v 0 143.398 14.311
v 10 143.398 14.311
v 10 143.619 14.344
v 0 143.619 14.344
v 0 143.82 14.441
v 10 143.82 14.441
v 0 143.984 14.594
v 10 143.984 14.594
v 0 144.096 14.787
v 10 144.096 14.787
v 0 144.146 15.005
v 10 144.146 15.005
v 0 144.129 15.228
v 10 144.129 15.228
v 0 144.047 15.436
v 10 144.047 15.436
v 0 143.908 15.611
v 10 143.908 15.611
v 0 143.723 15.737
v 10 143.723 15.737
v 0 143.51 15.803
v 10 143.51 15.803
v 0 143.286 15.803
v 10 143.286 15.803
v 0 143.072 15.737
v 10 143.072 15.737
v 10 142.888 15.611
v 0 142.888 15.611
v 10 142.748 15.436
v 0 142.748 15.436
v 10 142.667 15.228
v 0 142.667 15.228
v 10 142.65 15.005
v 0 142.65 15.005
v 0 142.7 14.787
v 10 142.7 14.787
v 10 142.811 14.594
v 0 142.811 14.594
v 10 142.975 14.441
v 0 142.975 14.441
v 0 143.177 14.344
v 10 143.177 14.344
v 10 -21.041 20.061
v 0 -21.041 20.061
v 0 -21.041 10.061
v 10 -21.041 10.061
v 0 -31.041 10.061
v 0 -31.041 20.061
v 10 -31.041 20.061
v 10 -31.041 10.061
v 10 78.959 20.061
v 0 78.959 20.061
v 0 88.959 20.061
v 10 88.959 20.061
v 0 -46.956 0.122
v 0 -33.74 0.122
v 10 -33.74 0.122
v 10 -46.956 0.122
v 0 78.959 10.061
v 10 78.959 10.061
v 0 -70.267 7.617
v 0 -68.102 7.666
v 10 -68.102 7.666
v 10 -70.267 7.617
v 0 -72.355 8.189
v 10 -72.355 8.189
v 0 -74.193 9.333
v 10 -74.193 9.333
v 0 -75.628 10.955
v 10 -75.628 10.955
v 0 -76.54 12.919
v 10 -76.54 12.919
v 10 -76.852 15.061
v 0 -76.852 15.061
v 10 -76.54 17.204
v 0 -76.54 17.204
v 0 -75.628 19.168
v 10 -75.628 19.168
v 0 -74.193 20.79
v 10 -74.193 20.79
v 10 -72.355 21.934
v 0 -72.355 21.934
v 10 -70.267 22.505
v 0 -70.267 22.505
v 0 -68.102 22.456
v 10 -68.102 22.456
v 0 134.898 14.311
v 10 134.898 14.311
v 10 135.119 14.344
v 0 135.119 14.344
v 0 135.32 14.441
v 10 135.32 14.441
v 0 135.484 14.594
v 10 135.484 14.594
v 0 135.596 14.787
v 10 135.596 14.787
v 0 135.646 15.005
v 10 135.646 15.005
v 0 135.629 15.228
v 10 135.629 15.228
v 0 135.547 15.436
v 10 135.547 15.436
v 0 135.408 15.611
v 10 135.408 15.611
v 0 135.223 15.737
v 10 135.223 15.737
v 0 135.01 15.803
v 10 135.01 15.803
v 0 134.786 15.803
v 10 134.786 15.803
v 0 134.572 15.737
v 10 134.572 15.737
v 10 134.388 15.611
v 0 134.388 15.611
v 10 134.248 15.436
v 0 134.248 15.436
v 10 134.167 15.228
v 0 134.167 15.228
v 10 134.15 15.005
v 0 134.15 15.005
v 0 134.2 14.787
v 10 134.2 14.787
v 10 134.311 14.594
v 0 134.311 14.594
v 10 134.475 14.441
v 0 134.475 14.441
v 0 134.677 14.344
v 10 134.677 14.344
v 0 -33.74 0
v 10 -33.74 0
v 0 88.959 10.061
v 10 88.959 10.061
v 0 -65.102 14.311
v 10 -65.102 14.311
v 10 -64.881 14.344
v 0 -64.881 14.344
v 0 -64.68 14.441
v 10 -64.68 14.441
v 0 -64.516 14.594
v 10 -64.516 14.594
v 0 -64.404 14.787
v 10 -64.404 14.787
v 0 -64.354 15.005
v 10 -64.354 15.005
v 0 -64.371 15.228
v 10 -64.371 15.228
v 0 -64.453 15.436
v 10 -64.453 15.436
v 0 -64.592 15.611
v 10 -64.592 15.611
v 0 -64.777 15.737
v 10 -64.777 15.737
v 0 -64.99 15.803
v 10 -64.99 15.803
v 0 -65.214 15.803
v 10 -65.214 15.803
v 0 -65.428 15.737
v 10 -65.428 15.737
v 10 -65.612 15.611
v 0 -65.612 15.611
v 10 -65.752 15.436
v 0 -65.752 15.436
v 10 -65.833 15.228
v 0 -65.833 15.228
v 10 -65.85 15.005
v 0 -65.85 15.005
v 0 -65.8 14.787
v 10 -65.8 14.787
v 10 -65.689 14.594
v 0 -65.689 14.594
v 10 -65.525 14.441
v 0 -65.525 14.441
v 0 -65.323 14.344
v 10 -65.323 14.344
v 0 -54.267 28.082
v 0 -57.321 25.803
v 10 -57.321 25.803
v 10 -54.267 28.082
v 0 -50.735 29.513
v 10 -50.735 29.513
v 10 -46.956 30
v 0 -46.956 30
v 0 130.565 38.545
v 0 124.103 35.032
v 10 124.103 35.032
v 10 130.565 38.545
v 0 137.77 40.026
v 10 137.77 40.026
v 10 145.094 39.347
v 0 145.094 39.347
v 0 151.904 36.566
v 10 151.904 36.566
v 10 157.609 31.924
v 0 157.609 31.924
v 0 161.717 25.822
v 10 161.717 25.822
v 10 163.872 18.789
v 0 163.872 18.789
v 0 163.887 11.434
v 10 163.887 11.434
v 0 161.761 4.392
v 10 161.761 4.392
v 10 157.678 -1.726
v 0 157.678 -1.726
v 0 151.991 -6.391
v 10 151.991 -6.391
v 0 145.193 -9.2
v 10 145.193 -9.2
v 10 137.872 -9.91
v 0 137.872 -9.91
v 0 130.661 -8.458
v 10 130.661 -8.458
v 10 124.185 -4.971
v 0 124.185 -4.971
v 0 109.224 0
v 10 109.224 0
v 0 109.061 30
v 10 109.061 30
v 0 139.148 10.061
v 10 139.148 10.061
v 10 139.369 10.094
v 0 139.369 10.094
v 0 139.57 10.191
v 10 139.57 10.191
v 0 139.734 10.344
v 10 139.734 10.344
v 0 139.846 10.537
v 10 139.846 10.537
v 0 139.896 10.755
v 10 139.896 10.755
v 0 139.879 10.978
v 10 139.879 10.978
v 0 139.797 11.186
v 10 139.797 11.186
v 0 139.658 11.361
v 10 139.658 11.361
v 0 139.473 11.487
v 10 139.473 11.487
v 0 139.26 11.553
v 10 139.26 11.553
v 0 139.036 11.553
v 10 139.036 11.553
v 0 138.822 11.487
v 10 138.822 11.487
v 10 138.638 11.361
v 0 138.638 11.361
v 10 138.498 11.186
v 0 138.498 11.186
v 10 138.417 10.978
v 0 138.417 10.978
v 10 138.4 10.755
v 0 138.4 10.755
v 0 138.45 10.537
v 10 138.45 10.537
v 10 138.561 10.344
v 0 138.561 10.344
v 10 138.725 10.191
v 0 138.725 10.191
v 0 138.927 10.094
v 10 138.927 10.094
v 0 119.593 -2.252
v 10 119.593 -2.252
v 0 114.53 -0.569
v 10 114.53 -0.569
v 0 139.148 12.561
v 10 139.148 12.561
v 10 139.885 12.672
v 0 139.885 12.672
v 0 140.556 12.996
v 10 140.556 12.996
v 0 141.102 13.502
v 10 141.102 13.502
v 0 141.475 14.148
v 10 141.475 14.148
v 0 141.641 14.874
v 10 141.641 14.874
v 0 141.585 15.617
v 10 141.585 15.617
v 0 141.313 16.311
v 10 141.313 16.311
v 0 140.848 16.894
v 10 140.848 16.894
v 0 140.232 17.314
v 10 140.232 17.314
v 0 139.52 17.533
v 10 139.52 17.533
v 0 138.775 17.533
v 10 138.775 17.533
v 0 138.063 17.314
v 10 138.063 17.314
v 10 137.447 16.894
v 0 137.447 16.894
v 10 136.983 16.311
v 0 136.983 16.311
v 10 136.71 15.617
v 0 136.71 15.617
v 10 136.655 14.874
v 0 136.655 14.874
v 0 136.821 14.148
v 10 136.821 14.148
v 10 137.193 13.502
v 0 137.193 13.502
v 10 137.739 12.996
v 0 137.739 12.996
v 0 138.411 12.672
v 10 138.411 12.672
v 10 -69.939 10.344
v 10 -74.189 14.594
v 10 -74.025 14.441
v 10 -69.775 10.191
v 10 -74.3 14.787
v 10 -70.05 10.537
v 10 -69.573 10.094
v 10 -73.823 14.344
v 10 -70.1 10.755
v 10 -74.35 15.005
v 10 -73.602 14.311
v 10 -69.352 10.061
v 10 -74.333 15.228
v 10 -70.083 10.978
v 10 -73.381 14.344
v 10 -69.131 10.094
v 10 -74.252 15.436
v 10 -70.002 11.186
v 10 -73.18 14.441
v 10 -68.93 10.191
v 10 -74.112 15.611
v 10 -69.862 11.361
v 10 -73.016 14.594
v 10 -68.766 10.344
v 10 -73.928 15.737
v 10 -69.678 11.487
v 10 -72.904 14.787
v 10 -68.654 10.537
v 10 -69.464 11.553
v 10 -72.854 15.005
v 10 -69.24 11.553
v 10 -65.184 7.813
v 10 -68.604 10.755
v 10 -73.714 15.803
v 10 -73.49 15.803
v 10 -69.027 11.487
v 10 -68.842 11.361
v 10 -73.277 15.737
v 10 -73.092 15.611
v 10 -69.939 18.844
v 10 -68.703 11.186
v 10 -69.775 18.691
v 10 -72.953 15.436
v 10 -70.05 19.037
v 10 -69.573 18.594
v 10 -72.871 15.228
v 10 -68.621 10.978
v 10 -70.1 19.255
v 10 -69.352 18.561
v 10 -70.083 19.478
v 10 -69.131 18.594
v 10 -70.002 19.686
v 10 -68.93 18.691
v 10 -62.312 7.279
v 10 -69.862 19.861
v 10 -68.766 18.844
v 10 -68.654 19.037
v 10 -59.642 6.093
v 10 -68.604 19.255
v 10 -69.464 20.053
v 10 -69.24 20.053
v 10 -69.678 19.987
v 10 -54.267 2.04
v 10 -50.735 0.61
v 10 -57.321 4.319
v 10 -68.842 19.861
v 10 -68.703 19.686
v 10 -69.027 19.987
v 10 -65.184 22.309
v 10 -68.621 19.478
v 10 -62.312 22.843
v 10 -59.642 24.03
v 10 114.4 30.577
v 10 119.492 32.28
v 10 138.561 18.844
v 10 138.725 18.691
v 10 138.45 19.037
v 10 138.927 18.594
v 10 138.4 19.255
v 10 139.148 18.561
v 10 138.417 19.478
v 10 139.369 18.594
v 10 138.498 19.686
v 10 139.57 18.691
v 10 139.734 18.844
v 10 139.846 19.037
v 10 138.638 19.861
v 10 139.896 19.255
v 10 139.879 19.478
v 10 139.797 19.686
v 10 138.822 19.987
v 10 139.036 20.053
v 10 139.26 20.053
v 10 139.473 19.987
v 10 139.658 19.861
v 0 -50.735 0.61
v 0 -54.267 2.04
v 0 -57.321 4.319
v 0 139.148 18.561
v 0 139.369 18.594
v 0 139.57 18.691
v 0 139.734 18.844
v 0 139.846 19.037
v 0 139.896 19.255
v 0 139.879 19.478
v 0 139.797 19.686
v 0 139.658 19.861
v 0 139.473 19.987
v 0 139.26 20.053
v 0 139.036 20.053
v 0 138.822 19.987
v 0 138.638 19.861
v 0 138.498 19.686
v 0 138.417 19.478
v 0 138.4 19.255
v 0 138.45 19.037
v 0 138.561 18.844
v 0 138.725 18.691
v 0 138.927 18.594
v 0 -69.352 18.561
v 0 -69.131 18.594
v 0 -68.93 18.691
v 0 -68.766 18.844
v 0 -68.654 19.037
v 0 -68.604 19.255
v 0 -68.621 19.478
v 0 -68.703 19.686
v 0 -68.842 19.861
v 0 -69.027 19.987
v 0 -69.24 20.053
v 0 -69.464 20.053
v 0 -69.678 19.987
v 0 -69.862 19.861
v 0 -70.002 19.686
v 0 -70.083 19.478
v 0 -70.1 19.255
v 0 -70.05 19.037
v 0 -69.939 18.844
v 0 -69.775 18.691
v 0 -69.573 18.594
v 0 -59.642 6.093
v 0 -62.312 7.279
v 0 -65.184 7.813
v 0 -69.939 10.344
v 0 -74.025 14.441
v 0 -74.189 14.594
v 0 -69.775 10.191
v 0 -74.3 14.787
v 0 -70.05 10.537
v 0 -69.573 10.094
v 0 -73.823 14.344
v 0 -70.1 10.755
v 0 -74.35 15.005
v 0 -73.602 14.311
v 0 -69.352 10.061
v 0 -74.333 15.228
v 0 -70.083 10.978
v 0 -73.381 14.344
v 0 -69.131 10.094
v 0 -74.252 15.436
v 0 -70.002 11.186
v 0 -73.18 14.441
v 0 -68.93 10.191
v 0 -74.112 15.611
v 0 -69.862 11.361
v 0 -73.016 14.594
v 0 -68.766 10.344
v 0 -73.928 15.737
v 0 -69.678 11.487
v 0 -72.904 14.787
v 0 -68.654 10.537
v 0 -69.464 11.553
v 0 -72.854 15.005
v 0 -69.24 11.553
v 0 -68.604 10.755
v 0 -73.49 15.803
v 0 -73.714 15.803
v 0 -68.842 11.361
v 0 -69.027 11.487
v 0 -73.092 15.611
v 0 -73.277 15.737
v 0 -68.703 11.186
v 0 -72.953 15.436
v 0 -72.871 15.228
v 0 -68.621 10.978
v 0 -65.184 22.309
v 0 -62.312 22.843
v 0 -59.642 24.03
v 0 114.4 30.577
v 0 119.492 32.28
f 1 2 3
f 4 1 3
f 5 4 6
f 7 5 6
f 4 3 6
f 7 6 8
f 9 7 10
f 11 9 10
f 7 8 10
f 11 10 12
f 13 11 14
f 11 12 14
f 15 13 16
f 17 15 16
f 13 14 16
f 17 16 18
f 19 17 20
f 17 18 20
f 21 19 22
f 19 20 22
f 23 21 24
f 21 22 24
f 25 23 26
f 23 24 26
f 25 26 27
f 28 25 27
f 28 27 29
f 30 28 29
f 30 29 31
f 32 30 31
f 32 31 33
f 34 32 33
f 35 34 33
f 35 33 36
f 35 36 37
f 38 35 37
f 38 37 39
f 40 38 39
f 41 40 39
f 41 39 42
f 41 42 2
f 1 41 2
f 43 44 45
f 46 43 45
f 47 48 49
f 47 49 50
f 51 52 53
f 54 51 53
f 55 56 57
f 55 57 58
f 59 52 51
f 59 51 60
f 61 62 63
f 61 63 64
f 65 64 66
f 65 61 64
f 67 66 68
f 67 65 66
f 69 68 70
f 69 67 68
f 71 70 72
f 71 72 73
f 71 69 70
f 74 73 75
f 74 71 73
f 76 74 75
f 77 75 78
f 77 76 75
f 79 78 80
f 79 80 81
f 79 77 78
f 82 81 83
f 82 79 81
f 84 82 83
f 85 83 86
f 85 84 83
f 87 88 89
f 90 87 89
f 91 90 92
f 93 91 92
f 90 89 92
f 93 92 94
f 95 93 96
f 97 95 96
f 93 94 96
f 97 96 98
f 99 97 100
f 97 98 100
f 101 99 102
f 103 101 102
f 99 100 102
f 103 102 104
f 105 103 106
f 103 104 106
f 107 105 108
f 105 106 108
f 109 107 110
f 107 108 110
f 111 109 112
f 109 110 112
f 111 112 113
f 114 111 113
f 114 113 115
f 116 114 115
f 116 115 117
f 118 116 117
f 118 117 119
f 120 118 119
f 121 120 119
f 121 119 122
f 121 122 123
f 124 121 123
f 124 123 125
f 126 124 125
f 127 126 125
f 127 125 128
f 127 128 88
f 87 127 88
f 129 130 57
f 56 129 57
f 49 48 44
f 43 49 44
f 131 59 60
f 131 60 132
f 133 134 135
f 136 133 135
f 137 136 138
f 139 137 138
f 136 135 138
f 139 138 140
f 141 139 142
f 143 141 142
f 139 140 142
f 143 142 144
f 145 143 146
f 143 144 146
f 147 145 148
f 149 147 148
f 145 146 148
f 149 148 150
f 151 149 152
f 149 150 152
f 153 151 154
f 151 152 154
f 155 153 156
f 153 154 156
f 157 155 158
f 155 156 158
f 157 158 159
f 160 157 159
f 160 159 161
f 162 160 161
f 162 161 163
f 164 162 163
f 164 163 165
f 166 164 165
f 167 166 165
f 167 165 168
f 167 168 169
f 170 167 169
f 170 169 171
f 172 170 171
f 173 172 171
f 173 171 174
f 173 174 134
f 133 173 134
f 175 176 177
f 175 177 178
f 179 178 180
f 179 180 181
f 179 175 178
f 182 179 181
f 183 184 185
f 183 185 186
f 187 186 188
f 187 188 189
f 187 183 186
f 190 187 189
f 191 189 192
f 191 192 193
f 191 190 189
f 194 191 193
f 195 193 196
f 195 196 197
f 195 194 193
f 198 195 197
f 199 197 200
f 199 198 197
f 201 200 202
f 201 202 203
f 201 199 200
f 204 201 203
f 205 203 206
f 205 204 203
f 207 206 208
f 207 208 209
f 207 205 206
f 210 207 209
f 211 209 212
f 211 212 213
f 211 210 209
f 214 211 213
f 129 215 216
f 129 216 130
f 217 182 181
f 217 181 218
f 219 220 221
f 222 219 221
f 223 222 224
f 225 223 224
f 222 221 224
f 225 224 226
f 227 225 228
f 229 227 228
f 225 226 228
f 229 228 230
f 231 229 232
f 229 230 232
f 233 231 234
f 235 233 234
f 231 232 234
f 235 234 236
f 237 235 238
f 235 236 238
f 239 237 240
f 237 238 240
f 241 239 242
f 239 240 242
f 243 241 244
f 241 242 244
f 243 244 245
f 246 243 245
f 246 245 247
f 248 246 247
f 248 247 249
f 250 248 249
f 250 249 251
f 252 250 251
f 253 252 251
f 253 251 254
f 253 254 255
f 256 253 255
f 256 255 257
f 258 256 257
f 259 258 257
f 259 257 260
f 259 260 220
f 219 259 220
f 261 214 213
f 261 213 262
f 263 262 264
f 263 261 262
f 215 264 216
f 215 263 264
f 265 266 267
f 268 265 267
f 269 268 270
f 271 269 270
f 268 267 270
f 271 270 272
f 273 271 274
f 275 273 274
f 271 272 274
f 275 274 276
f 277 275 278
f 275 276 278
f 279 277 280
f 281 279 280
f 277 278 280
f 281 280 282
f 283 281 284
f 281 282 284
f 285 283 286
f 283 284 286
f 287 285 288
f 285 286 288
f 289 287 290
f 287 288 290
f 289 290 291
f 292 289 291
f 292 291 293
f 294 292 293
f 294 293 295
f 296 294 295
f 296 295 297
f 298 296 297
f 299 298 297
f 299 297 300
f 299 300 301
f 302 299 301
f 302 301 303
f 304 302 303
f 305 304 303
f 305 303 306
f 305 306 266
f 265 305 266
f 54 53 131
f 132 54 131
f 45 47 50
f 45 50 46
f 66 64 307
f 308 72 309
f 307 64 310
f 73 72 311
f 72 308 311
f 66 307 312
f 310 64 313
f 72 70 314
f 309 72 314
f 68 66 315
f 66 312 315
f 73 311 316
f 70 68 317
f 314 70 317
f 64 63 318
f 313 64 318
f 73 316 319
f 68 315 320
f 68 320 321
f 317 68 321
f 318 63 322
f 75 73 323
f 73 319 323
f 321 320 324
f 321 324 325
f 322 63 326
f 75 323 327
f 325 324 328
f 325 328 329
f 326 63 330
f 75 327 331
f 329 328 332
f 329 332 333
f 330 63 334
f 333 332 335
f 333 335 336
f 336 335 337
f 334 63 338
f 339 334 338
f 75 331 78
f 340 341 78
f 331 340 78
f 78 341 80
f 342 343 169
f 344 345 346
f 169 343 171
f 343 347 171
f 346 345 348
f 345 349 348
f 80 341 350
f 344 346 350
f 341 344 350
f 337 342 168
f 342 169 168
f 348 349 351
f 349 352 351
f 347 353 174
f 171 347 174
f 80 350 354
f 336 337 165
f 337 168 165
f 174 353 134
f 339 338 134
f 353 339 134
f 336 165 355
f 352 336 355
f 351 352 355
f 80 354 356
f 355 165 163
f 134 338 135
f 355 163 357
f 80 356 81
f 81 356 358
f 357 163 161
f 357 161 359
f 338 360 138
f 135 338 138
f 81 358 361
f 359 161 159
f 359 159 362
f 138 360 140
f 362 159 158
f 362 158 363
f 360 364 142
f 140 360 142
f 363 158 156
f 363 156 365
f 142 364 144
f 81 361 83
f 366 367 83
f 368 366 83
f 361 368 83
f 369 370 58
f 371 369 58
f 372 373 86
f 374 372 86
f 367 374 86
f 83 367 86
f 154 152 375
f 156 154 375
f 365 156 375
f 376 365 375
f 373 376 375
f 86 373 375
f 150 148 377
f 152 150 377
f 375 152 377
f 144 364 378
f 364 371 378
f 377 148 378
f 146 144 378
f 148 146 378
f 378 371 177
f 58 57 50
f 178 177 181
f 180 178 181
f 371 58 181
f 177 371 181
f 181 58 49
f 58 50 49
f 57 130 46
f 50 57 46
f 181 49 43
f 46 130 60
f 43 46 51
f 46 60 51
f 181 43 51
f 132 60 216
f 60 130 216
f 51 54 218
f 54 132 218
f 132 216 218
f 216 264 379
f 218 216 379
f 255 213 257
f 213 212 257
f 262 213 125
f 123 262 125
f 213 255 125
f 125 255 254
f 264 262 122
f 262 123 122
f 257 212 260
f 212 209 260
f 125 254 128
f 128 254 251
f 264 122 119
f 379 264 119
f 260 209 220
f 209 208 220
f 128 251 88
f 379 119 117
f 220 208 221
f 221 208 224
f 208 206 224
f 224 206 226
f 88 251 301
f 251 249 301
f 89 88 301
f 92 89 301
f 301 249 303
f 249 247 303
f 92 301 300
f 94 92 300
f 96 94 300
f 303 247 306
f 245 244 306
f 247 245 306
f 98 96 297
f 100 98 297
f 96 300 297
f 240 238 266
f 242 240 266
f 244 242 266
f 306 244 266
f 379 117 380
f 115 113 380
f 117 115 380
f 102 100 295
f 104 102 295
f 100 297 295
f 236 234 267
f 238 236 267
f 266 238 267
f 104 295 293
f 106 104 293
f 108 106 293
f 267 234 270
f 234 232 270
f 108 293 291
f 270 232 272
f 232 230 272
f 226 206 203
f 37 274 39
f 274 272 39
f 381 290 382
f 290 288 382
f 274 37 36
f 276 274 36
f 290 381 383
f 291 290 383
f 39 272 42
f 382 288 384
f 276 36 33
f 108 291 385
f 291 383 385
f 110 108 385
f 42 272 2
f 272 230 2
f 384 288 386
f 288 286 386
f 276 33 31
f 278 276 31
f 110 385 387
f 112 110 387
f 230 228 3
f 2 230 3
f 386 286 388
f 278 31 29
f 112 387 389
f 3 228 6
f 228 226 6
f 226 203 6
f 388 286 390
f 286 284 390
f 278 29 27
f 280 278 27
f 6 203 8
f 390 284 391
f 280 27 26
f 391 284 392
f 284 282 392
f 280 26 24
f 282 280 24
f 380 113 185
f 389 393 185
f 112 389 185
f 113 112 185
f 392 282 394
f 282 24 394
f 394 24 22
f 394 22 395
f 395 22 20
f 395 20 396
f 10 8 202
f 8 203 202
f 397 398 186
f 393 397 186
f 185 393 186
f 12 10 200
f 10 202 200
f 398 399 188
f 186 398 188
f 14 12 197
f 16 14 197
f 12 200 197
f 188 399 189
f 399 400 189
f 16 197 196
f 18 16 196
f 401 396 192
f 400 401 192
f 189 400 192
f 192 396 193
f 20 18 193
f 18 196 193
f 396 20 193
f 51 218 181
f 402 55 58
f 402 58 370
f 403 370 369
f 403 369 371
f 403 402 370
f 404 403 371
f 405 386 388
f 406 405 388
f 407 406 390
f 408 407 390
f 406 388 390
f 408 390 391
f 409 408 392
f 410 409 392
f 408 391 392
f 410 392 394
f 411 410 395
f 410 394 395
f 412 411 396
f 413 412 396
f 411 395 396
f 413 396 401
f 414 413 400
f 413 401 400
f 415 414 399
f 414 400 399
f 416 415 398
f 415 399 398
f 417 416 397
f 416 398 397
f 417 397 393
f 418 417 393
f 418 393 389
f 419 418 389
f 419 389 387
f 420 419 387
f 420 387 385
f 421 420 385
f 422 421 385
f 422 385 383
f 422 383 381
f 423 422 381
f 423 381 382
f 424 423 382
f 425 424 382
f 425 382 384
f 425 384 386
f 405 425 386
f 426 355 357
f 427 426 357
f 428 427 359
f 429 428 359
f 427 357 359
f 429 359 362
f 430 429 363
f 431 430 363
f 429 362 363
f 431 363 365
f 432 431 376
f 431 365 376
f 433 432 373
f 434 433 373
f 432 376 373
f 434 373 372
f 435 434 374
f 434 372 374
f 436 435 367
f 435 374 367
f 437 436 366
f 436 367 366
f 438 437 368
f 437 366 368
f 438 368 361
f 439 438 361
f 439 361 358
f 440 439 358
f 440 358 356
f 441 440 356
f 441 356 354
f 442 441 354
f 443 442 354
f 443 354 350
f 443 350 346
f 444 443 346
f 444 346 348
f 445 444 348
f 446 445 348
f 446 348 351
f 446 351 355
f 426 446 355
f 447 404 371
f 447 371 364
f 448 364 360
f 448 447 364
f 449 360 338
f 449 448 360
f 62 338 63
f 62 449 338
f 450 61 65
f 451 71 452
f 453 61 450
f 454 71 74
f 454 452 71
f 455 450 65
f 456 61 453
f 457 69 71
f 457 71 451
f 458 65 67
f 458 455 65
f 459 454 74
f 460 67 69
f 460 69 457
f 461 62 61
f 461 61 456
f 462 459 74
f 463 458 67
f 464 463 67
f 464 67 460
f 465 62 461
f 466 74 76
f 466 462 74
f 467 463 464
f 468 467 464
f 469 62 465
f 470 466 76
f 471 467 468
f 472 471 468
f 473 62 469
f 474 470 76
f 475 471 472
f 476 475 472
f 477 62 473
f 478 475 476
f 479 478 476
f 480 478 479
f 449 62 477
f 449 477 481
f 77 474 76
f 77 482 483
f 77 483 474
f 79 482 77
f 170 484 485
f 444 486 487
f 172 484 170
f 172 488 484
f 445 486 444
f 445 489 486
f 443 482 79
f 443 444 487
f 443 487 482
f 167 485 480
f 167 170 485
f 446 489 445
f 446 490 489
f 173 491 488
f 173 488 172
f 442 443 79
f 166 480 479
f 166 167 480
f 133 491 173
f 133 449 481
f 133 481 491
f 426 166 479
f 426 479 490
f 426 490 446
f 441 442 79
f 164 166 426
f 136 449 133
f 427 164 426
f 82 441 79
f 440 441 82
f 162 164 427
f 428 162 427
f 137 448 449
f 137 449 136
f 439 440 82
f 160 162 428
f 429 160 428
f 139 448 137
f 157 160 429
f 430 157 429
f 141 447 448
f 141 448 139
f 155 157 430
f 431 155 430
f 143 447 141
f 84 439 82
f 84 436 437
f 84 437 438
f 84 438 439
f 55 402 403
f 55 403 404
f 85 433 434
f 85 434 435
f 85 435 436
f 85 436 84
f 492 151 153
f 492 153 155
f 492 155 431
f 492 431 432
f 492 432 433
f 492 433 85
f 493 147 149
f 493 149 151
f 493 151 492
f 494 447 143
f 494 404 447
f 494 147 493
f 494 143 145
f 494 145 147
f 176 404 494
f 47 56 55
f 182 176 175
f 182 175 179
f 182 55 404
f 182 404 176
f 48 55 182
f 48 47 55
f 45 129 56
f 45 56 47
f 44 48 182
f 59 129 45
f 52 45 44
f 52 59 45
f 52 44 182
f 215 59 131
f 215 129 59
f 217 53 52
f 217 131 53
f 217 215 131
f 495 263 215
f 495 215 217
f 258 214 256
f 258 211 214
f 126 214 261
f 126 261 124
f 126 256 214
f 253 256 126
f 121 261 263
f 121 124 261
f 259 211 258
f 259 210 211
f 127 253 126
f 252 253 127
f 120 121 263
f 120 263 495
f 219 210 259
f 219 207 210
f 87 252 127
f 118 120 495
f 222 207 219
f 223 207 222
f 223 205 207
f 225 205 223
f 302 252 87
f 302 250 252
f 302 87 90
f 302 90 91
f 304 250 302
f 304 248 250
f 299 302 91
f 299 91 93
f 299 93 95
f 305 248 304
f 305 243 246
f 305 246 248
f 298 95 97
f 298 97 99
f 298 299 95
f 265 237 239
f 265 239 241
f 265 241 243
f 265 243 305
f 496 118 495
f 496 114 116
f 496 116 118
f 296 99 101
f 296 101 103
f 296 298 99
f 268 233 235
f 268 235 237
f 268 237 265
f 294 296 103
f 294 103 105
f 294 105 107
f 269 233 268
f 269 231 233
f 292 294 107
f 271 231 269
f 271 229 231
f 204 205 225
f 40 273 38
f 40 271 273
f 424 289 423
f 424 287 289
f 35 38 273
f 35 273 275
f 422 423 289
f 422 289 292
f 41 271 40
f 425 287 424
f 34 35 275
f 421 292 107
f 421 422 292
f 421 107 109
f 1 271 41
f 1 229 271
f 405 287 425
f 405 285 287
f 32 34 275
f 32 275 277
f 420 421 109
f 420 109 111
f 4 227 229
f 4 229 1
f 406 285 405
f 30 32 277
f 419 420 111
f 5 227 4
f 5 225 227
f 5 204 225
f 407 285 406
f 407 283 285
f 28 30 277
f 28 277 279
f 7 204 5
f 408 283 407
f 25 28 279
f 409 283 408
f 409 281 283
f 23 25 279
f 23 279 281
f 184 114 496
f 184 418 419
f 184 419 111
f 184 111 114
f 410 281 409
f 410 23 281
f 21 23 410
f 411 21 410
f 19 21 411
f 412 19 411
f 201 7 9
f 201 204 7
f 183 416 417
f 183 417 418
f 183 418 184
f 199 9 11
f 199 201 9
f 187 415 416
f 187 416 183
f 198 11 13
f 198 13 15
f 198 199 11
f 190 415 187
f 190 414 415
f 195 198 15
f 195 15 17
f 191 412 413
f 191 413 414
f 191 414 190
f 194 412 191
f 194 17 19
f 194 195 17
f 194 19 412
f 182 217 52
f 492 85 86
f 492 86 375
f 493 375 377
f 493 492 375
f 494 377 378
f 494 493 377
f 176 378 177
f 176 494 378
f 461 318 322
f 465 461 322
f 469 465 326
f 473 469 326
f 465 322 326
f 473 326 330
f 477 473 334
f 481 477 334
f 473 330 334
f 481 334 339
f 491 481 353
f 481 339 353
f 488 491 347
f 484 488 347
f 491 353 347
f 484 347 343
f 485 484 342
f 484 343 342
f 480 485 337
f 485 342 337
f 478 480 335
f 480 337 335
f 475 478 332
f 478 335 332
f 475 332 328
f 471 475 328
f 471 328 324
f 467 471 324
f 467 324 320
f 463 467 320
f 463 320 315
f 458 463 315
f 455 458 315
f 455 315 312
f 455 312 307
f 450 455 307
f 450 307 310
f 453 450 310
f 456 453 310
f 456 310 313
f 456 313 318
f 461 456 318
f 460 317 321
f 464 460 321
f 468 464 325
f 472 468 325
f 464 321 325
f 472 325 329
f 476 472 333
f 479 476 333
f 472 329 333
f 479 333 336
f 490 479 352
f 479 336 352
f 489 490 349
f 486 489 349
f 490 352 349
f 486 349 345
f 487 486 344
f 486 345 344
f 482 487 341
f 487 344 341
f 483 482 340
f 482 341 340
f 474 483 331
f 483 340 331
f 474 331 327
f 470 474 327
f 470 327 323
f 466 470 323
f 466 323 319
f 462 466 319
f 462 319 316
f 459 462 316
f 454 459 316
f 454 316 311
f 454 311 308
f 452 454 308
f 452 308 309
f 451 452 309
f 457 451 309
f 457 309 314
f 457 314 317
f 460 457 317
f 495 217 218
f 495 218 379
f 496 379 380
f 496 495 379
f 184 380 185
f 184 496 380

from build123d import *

# Parameters (mm, degrees)
SKETCH1_W           = 10
SKETCH1_H           = 10
BOSS_EXTRUDE1_DEPTH = 10
SKETCH2_R           = 0.75
CUT_EXTRUDE1_DEPTH  = 170.265249142
SKETCH3_R           = 0.75
CUT_EXTRUDE2_DEPTH  = 170.265249142
CUT_EXTRUDE5_START  = -10
CUT_EXTRUDE5_DEPTH  = 10
SKETCH5_R           = 2.5
CUT_EXTRUDE6_DEPTH  = 170.265249142


with BuildPart() as part:
    # Sketch1 → Boss-Extrude1 (new body)
    with BuildSketch(Plane(origin=(0, 0, 0), x_dir=(0, 0, -1), z_dir=(1, 0, 0))):
        with BuildLine():
            Line((0, 109.22405545), (0, -43.10336506))
            ThreePointArc((0, -43.10336506), (0.541577594, -48.278843147), (2.142845875, -53.230087397))
            ThreePointArc((2.142845875, -53.230087397), (-15.125529103, -79.668997921), (-32.212650318, -53.112585274))
            ThreePointArc((-32.212650318, -53.112585274), (-30.559421631, -48.088849966), (-30, -42.82975033))
            Line((-30, -42.82975033), (-30, 109.060958061))
            ThreePointArc((-30, 109.060958061), (-31.291322972, 116.99182394), (-35.031890687, 124.103385075))
            ThreePointArc((-35.031890687, 124.103385075), (-15.112146754, 164.150992221), (4.970722417, 124.184939097))
            ThreePointArc((4.970722417, 124.184939097), (1.275203483, 117.106569656), (0, 109.22405545))
        make_face()
        with Locations((-15.061172266, 83.959086258)):
            Rectangle(SKETCH1_W, SKETCH1_H, mode=Mode.SUBTRACT)
        with Locations((-15.061172266, -26.040913742)):
            Rectangle(SKETCH1_W, SKETCH1_H, mode=Mode.SUBTRACT)
    extrude(amount=BOSS_EXTRUDE1_DEPTH)

    # Sketch2 → Cut-Extrude1 (cut, through all)
    with BuildSketch(Plane(origin=(10, 0, 0), x_dir=(0, 0, -1), z_dir=(1, 0, 0))):
        with Locations((-15.061172266, 143.397777589)):
            Circle(SKETCH2_R)
        with Locations((-19.311172266, 139.147777589)):
            Circle(SKETCH2_R)
        with Locations((-10.811172266, 139.147777589)):
            Circle(SKETCH2_R)
        with Locations((-15.061172266, 134.897777589)):
            Circle(SKETCH2_R)
    extrude(amount=-CUT_EXTRUDE1_DEPTH, mode=Mode.SUBTRACT)

    # Sketch3 → Cut-Extrude2 (cut, through all)
    with BuildSketch(Plane(origin=(10, 0, 0), x_dir=(0, 0, -1), z_dir=(1, 0, 0))):
        with Locations((-19.311172266, -69.352222411)):
            Circle(SKETCH3_R)
        with Locations((-15.061172266, -65.102222411)):
            Circle(SKETCH3_R)
        with Locations((-10.811172266, -69.352222411)):
            Circle(SKETCH3_R)
        with Locations((-15.061172266, -73.602222411)):
            Circle(SKETCH3_R)
    extrude(amount=-CUT_EXTRUDE2_DEPTH, mode=Mode.SUBTRACT)

    # Sketch4 → Cut-Extrude5 (cut)
    with BuildSketch(Plane(origin=(10, 0, 0), x_dir=(0, 0, -1), z_dir=(1, 0, 0)).offset(CUT_EXTRUDE5_START)):
        with BuildLine():
            Line((-30, -42.82975033), (-30, -33.739733883))
            Line((-30, -33.739733883), (-50.712575643, -33.739733883))
            Line((-50.712575643, -33.739733883), (-50.712575643, -86.676053834))
            Line((-50.712575643, -86.676053834), (22.03762198, -86.676053834))
            Line((22.03762198, -86.676053834), (22.03762198, -33.739733883))
            Line((22.03762198, -33.739733883), (0, -33.739733883))
            Line((0, -33.739733883), (0, -43.10336506))
            ThreePointArc((0, -43.10336506), (0.541577594, -48.278843147), (2.142845875, -53.230087397))
            ThreePointArc((2.142845875, -53.230087397), (-15.125529103, -79.668997921), (-32.212650318, -53.112585274))
            ThreePointArc((-32.212650318, -53.112585274), (-30.559421631, -48.088849966), (-30, -42.82975033))
        make_face()
        with BuildLine():
            Line((-30, -46.956071773), (-30, -42.82975033))
            ThreePointArc((-30, -42.82975033), (-30.559421631, -48.088849966), (-32.212650318, -53.112585274))
            ThreePointArc((-32.212650318, -53.112585274), (-15.125529103, -79.668997921), (2.142845875, -53.230087397))
            ThreePointArc((2.142845875, -53.230087397), (0.541577594, -48.278843147), (0, -43.10336506))
            Line((0, -43.10336506), (0, -33.739733883))
            Line((0, -33.739733883), (-0.122344533, -33.739733883))
            Line((-0.122344533, -33.739733883), (-0.122344533, -46.956071773))
            ThreePointArc((-0.122344533, -46.956071773), (-1.211385526, -52.547049066), (-4.319271357, -57.320526105))
            ThreePointArc((-4.319271357, -57.320526105), (-7.279094989, -62.31182931), (-7.666142531, -68.101808395))
            ThreePointArc((-7.666142531, -68.101808395), (-15.061172266, -76.852222411), (-22.456202002, -68.101808395))
            ThreePointArc((-22.456202002, -68.101808395), (-22.843249544, -62.31182931), (-25.803073176, -57.320526105))
            ThreePointArc((-25.803073176, -57.320526105), (-28.910959007, -52.547049066), (-30, -46.956071773))
        make_face()
    extrude(amount=CUT_EXTRUDE5_DEPTH, mode=Mode.SUBTRACT)

    # Sketch5 → Cut-Extrude6 (cut, through all)
    with BuildSketch(Plane(origin=(10, 0, 0), x_dir=(0, 0, -1), z_dir=(1, 0, 0))):
        with Locations((-15.061172266, 139.147777589)):
            Circle(SKETCH5_R)
    extrude(amount=-CUT_EXTRUDE6_DEPTH, mode=Mode.SUBTRACT)


solid = part.part
